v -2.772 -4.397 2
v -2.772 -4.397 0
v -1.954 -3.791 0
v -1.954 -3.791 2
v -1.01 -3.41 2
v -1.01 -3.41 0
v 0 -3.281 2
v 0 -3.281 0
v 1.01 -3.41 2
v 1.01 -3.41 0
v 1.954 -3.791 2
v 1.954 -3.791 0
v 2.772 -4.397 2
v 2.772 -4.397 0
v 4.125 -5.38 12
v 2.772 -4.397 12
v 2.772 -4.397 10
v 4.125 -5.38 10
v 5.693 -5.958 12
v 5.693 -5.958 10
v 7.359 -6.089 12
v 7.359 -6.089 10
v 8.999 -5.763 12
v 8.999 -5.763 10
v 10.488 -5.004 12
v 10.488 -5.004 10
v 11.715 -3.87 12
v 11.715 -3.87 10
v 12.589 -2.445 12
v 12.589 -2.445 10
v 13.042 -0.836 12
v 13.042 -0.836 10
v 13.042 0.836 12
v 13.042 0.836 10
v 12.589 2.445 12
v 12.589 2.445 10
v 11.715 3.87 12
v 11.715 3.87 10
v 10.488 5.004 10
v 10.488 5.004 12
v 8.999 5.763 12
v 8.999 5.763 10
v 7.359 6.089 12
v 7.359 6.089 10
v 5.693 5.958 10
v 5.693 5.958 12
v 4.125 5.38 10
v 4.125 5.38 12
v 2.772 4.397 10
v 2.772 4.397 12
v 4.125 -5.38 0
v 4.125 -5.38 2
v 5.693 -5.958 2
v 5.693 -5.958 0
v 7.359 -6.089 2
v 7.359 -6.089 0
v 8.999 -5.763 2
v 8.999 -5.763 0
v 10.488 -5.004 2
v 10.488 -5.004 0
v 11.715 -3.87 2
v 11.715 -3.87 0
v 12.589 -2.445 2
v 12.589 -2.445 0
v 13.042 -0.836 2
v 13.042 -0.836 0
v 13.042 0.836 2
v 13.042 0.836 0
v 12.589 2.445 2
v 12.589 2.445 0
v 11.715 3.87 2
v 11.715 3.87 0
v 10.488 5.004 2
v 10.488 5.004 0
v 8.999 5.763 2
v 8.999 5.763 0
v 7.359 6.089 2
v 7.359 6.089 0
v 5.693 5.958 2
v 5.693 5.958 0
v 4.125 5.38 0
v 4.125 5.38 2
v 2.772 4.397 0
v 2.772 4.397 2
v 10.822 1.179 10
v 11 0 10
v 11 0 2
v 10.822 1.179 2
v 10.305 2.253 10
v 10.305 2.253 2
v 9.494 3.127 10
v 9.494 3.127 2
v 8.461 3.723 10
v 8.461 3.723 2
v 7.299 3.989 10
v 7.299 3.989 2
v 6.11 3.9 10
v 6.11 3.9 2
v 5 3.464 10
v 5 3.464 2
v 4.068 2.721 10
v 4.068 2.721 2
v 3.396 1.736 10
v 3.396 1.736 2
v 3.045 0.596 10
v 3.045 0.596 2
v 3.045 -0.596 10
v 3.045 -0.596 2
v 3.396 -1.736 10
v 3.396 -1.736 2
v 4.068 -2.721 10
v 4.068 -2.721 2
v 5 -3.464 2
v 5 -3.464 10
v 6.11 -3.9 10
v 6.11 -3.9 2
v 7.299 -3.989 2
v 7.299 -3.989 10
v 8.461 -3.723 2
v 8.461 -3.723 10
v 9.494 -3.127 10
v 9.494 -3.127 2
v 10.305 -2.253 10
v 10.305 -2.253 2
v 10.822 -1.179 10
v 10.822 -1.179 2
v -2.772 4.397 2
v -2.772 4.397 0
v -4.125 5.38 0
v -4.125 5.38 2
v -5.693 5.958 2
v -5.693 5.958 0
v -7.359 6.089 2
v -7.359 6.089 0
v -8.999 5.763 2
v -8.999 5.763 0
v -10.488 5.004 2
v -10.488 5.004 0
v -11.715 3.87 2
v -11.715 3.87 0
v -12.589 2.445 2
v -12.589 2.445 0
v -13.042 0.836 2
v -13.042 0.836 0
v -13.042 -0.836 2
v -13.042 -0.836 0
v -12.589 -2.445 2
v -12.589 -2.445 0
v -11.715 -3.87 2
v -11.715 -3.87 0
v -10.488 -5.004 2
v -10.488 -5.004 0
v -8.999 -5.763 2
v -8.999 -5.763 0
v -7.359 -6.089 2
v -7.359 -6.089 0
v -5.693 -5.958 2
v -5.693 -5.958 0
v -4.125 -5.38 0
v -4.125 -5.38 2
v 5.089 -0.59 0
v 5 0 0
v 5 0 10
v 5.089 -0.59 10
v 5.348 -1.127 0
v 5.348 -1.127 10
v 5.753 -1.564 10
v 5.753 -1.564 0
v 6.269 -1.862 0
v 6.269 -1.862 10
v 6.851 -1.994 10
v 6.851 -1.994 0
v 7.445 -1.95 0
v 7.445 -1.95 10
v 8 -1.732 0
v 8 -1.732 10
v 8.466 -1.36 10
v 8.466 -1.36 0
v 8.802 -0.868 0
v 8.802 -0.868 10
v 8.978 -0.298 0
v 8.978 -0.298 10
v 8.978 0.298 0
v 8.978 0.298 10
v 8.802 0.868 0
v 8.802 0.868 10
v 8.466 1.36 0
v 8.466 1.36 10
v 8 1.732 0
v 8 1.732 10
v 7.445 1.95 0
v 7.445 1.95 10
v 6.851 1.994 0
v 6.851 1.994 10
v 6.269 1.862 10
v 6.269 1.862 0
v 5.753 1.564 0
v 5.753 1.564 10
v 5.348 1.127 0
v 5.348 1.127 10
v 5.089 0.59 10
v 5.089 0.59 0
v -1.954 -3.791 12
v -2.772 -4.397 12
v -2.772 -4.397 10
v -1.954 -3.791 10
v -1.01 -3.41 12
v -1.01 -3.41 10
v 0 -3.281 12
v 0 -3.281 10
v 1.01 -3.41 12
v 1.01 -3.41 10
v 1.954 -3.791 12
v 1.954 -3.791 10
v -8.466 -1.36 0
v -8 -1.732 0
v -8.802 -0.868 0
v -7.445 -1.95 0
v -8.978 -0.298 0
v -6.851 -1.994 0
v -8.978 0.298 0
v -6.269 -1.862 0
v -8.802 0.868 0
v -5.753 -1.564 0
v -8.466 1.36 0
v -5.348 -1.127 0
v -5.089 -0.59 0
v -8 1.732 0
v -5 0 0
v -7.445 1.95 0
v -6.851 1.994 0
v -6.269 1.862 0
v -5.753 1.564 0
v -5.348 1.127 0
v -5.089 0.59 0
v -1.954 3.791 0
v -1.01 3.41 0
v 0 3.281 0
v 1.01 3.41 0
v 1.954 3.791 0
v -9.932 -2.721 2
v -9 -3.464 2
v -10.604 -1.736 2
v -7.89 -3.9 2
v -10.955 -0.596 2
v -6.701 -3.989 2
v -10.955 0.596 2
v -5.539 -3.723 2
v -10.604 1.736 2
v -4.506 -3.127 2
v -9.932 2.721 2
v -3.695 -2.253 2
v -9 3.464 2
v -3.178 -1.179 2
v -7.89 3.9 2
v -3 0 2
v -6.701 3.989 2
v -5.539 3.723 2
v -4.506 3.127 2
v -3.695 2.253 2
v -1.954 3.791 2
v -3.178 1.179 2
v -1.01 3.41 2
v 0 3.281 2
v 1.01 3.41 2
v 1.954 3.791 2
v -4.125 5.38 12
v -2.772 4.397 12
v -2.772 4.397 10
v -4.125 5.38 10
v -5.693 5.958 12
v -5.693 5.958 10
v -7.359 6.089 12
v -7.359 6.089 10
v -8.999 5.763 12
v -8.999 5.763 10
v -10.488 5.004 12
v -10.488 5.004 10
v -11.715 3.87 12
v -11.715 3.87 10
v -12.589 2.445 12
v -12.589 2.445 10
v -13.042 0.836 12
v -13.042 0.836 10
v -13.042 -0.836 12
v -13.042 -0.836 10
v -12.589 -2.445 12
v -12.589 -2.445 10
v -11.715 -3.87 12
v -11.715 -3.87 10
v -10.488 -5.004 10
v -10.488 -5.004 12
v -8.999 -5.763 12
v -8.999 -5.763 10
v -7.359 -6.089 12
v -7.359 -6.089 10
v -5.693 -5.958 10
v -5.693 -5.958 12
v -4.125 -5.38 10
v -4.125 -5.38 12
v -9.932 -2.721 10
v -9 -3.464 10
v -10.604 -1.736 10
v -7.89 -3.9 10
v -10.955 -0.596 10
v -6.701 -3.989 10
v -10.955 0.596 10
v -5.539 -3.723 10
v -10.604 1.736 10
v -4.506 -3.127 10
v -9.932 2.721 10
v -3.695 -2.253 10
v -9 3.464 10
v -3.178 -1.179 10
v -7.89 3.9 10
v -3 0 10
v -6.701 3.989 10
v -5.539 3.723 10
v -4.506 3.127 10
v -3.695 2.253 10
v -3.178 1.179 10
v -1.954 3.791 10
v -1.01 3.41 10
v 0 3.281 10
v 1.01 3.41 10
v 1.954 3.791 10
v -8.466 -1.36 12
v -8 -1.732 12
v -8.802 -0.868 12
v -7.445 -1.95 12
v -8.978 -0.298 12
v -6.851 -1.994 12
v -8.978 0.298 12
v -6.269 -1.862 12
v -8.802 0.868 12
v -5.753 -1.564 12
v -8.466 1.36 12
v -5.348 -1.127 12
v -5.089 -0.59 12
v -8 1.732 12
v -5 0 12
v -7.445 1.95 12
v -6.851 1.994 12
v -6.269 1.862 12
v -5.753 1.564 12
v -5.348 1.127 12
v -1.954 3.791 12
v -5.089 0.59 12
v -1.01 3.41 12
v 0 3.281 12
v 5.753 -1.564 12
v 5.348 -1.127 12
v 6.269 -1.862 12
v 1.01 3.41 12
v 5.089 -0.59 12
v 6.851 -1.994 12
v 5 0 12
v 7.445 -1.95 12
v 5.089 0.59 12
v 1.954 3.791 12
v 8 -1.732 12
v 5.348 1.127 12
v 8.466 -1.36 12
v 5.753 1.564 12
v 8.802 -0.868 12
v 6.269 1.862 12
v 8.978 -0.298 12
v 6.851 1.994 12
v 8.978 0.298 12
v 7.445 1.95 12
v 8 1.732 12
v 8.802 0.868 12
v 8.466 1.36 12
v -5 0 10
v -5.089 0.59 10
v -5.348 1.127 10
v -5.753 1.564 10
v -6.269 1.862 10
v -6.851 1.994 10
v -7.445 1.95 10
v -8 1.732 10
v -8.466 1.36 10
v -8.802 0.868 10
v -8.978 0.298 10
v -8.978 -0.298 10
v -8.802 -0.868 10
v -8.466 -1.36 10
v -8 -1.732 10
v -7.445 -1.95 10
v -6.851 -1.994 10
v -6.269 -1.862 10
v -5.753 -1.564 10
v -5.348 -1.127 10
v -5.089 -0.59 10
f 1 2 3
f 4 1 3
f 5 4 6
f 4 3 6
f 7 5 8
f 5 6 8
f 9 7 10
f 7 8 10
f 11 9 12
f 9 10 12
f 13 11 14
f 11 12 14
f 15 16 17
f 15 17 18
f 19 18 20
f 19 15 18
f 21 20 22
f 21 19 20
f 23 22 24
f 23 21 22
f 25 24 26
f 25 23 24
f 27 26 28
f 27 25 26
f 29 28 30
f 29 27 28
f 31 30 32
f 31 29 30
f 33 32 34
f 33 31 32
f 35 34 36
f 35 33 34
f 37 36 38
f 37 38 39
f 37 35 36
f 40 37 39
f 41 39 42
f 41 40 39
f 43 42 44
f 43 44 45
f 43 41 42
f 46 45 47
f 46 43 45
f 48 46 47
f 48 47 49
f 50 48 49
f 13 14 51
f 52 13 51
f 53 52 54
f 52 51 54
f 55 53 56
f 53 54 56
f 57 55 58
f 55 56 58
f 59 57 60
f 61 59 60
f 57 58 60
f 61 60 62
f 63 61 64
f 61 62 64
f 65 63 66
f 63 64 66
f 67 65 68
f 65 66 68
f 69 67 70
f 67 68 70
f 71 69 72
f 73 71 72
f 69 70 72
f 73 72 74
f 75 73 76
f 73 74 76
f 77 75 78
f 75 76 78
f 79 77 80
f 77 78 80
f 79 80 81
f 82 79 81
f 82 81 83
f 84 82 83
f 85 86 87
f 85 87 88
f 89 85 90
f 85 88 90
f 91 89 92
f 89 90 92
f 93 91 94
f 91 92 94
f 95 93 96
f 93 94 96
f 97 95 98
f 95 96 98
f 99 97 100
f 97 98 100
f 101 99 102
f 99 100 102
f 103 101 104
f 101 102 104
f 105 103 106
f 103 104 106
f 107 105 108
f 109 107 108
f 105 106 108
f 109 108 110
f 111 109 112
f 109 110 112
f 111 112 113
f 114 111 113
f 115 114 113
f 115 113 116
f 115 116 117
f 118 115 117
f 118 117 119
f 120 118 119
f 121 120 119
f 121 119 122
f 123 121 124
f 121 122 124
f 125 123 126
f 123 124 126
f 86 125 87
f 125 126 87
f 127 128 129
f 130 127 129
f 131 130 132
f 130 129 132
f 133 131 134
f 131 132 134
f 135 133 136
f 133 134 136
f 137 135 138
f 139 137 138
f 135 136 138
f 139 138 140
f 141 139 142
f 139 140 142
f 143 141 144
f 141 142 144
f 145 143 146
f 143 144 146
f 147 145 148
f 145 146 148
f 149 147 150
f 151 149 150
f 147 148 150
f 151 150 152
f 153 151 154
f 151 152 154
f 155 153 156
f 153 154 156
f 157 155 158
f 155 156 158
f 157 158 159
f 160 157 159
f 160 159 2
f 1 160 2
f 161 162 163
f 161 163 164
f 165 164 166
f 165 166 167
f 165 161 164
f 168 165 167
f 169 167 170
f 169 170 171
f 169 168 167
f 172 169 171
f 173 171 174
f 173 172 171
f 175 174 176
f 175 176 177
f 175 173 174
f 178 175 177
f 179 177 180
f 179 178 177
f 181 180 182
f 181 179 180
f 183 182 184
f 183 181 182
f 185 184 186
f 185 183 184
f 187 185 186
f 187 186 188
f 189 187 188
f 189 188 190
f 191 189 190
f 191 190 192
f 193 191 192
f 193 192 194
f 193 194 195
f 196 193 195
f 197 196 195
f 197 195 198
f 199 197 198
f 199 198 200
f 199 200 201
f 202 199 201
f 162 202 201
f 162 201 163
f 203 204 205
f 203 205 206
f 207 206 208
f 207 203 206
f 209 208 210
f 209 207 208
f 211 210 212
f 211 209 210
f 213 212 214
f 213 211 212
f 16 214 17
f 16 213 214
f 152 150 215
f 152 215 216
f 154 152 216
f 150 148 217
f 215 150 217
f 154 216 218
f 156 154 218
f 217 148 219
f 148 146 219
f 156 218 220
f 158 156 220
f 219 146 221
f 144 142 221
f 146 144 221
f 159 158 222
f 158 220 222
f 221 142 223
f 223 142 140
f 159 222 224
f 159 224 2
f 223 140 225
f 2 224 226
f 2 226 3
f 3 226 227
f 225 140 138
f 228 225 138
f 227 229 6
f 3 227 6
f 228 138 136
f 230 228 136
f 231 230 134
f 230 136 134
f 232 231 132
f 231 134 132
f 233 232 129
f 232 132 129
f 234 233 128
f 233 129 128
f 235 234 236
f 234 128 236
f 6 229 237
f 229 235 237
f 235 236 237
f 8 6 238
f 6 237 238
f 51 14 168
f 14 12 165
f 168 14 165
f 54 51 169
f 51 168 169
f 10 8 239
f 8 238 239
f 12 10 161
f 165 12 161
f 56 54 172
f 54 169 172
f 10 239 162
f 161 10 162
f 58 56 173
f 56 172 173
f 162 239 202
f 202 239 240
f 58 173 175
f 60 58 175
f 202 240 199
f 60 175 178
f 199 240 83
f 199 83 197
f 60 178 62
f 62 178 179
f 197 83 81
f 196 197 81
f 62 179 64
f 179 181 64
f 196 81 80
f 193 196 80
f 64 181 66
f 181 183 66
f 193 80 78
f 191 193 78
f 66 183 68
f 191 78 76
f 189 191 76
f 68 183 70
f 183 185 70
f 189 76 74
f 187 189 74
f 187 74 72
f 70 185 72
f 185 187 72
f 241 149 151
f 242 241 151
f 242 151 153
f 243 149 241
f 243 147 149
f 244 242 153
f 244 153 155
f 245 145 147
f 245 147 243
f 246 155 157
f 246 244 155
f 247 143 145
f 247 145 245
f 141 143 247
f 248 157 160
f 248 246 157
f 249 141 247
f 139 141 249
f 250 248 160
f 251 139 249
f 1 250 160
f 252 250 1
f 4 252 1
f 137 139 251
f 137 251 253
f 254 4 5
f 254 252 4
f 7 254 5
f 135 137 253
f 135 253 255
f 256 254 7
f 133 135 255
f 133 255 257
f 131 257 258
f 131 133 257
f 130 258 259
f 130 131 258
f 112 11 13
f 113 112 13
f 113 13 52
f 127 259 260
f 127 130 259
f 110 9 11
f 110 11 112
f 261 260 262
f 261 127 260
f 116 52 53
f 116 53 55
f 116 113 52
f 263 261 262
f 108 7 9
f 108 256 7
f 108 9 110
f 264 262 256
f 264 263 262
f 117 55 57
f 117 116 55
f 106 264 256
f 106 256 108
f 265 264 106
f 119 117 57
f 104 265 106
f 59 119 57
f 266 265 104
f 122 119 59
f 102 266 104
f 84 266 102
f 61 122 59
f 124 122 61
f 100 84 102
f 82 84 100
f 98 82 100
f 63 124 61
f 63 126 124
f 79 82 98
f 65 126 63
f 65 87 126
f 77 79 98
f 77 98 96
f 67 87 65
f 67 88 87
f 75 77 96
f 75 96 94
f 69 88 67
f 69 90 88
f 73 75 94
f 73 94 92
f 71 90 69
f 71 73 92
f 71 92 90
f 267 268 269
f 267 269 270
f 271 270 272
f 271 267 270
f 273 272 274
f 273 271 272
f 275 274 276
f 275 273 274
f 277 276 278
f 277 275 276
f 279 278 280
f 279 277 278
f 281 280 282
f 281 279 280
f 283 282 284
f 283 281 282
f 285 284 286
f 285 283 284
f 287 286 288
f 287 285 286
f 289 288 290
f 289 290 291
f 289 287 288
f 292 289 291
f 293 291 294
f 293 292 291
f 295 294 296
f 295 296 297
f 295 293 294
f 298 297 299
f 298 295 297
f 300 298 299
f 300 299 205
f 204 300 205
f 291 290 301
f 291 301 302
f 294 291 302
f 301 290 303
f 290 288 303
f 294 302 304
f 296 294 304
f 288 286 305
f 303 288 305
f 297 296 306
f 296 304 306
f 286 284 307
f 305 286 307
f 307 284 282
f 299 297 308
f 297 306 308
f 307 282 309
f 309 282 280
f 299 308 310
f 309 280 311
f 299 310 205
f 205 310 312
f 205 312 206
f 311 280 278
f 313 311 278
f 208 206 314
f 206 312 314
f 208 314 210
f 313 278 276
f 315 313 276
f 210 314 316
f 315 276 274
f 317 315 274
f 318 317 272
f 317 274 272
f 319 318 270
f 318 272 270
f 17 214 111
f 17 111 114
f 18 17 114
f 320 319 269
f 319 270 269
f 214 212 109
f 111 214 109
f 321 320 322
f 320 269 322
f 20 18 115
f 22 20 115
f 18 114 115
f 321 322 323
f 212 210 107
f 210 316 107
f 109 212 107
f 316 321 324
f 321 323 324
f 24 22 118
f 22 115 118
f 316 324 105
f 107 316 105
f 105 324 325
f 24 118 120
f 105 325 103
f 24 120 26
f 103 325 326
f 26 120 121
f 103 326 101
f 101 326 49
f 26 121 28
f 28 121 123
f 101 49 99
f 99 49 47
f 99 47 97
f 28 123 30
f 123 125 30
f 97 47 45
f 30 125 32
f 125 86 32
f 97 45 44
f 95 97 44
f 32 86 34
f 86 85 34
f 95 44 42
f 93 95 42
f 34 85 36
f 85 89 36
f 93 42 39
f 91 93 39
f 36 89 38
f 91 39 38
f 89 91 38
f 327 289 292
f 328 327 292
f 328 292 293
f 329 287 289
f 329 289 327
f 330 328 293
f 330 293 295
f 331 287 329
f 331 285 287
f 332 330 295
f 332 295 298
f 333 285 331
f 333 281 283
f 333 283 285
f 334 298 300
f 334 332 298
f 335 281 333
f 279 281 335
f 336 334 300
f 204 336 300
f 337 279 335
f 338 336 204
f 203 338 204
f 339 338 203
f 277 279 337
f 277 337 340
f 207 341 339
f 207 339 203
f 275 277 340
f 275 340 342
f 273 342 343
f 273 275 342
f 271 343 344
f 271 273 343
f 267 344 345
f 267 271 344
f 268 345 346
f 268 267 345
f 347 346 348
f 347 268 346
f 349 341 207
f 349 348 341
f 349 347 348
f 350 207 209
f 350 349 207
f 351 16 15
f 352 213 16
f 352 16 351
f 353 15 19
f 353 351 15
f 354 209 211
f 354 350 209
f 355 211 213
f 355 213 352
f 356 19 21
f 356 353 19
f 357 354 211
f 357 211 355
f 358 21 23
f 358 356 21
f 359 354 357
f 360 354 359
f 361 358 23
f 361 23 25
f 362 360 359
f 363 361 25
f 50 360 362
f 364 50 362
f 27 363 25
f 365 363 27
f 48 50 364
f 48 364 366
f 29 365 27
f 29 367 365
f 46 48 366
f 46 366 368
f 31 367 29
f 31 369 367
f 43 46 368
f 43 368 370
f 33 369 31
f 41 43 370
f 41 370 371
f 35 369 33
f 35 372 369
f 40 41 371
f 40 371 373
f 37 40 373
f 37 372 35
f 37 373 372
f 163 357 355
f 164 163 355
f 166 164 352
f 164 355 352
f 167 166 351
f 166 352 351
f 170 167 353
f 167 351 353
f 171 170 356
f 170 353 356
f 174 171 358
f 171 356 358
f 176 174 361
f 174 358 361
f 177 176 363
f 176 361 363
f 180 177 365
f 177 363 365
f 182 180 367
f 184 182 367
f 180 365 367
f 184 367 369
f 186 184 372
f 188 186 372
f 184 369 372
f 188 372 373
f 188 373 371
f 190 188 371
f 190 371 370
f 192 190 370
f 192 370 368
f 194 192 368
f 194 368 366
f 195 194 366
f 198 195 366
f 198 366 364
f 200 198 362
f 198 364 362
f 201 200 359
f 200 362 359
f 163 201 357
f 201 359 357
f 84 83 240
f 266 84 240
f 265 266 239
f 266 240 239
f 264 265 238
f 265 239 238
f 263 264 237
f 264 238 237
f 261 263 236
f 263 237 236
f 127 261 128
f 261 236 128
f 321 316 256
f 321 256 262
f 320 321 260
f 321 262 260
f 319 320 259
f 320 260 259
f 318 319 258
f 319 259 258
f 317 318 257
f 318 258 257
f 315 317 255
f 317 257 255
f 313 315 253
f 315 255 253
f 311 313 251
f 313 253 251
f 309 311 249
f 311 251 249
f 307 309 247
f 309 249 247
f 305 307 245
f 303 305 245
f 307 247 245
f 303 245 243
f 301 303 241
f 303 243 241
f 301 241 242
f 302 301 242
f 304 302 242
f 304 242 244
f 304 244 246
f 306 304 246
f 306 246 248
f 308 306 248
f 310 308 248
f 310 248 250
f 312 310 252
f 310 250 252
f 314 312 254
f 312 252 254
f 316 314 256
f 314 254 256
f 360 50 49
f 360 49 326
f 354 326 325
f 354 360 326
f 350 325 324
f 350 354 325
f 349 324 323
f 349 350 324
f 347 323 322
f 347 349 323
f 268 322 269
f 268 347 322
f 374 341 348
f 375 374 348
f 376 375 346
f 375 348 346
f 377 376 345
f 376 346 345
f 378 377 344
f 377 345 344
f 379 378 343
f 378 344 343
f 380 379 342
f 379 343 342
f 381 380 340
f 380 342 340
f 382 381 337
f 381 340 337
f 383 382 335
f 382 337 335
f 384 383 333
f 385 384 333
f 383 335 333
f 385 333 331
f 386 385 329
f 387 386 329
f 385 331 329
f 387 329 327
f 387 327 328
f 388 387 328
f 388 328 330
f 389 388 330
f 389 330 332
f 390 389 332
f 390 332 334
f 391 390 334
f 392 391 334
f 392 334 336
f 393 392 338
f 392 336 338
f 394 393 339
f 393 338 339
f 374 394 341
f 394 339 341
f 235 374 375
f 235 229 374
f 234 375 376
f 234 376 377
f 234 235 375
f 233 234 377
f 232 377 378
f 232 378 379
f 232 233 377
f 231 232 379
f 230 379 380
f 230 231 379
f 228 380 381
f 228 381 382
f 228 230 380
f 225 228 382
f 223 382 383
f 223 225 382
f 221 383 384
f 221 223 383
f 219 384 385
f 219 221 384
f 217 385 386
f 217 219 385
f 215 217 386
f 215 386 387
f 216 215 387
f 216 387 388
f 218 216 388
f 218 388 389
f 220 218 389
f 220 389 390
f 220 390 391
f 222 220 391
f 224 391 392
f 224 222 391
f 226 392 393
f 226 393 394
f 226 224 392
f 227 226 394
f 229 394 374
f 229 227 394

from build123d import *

# Parameters (mm, degrees)
CROQUIS1_R              = 2
SALIENTE_EXTRUIR1_DEPTH = 2
CROQUIS2_R              = 4
CROQUIS2_R_2            = 2
SALIENTE_EXTRUIR2_DEPTH = 8


with BuildPart() as part:
    # Croquis1 → Saliente-Extruir1 (new body)
    with BuildSketch(Plane.XY):
        with BuildLine():
            ThreePointArc((-2.772277228, 4.397312834), (-13.1, 0), (-2.772277228, -4.397312834))
            ThreePointArc((-2.772277228, -4.397312834), (0, -3.28079666), (2.772277228, -4.397312834))
            ThreePointArc((2.772277228, -4.397312834), (13.1, 0), (2.772277228, 4.397312834))
            ThreePointArc((2.772277228, 4.397312834), (0, 3.28079666), (-2.772277228, 4.397312834))
        make_face()
        with Locations((-7, 0)):
            Circle(CROQUIS1_R, mode=Mode.SUBTRACT)
        with Locations(Location((7, 0, 0), (0, 0, 180))):
            Circle(CROQUIS1_R, mode=Mode.SUBTRACT)
    saliente_extruir1 = extrude(amount=SALIENTE_EXTRUIR1_DEPTH)

    # Croquis2 → Saliente-Extruir2 (add)
    # profile 1 of 2: a face of its own
    with BuildSketch(Plane.XY.offset(2)):
        with Locations((-7, 0)):
            Circle(CROQUIS2_R)
        with Locations((-7, 0)):
            Circle(CROQUIS2_R_2, mode=Mode.SUBTRACT)
    # profile 2 of 2: a face of its own
    with BuildSketch(Plane.XY.offset(2)):
        with Locations((7, 0)):
            Circle(CROQUIS2_R)
        with Locations(Location((7, 0, 0), (0, 0, 180))):
            Circle(CROQUIS2_R_2, mode=Mode.SUBTRACT)
    extrude(amount=SALIENTE_EXTRUIR2_DEPTH)

    # Simetría1: Saliente-Extruir1 across plane
    add(saliente_extruir1.mirror(Plane.XY.offset(6)))


solid = part.part
